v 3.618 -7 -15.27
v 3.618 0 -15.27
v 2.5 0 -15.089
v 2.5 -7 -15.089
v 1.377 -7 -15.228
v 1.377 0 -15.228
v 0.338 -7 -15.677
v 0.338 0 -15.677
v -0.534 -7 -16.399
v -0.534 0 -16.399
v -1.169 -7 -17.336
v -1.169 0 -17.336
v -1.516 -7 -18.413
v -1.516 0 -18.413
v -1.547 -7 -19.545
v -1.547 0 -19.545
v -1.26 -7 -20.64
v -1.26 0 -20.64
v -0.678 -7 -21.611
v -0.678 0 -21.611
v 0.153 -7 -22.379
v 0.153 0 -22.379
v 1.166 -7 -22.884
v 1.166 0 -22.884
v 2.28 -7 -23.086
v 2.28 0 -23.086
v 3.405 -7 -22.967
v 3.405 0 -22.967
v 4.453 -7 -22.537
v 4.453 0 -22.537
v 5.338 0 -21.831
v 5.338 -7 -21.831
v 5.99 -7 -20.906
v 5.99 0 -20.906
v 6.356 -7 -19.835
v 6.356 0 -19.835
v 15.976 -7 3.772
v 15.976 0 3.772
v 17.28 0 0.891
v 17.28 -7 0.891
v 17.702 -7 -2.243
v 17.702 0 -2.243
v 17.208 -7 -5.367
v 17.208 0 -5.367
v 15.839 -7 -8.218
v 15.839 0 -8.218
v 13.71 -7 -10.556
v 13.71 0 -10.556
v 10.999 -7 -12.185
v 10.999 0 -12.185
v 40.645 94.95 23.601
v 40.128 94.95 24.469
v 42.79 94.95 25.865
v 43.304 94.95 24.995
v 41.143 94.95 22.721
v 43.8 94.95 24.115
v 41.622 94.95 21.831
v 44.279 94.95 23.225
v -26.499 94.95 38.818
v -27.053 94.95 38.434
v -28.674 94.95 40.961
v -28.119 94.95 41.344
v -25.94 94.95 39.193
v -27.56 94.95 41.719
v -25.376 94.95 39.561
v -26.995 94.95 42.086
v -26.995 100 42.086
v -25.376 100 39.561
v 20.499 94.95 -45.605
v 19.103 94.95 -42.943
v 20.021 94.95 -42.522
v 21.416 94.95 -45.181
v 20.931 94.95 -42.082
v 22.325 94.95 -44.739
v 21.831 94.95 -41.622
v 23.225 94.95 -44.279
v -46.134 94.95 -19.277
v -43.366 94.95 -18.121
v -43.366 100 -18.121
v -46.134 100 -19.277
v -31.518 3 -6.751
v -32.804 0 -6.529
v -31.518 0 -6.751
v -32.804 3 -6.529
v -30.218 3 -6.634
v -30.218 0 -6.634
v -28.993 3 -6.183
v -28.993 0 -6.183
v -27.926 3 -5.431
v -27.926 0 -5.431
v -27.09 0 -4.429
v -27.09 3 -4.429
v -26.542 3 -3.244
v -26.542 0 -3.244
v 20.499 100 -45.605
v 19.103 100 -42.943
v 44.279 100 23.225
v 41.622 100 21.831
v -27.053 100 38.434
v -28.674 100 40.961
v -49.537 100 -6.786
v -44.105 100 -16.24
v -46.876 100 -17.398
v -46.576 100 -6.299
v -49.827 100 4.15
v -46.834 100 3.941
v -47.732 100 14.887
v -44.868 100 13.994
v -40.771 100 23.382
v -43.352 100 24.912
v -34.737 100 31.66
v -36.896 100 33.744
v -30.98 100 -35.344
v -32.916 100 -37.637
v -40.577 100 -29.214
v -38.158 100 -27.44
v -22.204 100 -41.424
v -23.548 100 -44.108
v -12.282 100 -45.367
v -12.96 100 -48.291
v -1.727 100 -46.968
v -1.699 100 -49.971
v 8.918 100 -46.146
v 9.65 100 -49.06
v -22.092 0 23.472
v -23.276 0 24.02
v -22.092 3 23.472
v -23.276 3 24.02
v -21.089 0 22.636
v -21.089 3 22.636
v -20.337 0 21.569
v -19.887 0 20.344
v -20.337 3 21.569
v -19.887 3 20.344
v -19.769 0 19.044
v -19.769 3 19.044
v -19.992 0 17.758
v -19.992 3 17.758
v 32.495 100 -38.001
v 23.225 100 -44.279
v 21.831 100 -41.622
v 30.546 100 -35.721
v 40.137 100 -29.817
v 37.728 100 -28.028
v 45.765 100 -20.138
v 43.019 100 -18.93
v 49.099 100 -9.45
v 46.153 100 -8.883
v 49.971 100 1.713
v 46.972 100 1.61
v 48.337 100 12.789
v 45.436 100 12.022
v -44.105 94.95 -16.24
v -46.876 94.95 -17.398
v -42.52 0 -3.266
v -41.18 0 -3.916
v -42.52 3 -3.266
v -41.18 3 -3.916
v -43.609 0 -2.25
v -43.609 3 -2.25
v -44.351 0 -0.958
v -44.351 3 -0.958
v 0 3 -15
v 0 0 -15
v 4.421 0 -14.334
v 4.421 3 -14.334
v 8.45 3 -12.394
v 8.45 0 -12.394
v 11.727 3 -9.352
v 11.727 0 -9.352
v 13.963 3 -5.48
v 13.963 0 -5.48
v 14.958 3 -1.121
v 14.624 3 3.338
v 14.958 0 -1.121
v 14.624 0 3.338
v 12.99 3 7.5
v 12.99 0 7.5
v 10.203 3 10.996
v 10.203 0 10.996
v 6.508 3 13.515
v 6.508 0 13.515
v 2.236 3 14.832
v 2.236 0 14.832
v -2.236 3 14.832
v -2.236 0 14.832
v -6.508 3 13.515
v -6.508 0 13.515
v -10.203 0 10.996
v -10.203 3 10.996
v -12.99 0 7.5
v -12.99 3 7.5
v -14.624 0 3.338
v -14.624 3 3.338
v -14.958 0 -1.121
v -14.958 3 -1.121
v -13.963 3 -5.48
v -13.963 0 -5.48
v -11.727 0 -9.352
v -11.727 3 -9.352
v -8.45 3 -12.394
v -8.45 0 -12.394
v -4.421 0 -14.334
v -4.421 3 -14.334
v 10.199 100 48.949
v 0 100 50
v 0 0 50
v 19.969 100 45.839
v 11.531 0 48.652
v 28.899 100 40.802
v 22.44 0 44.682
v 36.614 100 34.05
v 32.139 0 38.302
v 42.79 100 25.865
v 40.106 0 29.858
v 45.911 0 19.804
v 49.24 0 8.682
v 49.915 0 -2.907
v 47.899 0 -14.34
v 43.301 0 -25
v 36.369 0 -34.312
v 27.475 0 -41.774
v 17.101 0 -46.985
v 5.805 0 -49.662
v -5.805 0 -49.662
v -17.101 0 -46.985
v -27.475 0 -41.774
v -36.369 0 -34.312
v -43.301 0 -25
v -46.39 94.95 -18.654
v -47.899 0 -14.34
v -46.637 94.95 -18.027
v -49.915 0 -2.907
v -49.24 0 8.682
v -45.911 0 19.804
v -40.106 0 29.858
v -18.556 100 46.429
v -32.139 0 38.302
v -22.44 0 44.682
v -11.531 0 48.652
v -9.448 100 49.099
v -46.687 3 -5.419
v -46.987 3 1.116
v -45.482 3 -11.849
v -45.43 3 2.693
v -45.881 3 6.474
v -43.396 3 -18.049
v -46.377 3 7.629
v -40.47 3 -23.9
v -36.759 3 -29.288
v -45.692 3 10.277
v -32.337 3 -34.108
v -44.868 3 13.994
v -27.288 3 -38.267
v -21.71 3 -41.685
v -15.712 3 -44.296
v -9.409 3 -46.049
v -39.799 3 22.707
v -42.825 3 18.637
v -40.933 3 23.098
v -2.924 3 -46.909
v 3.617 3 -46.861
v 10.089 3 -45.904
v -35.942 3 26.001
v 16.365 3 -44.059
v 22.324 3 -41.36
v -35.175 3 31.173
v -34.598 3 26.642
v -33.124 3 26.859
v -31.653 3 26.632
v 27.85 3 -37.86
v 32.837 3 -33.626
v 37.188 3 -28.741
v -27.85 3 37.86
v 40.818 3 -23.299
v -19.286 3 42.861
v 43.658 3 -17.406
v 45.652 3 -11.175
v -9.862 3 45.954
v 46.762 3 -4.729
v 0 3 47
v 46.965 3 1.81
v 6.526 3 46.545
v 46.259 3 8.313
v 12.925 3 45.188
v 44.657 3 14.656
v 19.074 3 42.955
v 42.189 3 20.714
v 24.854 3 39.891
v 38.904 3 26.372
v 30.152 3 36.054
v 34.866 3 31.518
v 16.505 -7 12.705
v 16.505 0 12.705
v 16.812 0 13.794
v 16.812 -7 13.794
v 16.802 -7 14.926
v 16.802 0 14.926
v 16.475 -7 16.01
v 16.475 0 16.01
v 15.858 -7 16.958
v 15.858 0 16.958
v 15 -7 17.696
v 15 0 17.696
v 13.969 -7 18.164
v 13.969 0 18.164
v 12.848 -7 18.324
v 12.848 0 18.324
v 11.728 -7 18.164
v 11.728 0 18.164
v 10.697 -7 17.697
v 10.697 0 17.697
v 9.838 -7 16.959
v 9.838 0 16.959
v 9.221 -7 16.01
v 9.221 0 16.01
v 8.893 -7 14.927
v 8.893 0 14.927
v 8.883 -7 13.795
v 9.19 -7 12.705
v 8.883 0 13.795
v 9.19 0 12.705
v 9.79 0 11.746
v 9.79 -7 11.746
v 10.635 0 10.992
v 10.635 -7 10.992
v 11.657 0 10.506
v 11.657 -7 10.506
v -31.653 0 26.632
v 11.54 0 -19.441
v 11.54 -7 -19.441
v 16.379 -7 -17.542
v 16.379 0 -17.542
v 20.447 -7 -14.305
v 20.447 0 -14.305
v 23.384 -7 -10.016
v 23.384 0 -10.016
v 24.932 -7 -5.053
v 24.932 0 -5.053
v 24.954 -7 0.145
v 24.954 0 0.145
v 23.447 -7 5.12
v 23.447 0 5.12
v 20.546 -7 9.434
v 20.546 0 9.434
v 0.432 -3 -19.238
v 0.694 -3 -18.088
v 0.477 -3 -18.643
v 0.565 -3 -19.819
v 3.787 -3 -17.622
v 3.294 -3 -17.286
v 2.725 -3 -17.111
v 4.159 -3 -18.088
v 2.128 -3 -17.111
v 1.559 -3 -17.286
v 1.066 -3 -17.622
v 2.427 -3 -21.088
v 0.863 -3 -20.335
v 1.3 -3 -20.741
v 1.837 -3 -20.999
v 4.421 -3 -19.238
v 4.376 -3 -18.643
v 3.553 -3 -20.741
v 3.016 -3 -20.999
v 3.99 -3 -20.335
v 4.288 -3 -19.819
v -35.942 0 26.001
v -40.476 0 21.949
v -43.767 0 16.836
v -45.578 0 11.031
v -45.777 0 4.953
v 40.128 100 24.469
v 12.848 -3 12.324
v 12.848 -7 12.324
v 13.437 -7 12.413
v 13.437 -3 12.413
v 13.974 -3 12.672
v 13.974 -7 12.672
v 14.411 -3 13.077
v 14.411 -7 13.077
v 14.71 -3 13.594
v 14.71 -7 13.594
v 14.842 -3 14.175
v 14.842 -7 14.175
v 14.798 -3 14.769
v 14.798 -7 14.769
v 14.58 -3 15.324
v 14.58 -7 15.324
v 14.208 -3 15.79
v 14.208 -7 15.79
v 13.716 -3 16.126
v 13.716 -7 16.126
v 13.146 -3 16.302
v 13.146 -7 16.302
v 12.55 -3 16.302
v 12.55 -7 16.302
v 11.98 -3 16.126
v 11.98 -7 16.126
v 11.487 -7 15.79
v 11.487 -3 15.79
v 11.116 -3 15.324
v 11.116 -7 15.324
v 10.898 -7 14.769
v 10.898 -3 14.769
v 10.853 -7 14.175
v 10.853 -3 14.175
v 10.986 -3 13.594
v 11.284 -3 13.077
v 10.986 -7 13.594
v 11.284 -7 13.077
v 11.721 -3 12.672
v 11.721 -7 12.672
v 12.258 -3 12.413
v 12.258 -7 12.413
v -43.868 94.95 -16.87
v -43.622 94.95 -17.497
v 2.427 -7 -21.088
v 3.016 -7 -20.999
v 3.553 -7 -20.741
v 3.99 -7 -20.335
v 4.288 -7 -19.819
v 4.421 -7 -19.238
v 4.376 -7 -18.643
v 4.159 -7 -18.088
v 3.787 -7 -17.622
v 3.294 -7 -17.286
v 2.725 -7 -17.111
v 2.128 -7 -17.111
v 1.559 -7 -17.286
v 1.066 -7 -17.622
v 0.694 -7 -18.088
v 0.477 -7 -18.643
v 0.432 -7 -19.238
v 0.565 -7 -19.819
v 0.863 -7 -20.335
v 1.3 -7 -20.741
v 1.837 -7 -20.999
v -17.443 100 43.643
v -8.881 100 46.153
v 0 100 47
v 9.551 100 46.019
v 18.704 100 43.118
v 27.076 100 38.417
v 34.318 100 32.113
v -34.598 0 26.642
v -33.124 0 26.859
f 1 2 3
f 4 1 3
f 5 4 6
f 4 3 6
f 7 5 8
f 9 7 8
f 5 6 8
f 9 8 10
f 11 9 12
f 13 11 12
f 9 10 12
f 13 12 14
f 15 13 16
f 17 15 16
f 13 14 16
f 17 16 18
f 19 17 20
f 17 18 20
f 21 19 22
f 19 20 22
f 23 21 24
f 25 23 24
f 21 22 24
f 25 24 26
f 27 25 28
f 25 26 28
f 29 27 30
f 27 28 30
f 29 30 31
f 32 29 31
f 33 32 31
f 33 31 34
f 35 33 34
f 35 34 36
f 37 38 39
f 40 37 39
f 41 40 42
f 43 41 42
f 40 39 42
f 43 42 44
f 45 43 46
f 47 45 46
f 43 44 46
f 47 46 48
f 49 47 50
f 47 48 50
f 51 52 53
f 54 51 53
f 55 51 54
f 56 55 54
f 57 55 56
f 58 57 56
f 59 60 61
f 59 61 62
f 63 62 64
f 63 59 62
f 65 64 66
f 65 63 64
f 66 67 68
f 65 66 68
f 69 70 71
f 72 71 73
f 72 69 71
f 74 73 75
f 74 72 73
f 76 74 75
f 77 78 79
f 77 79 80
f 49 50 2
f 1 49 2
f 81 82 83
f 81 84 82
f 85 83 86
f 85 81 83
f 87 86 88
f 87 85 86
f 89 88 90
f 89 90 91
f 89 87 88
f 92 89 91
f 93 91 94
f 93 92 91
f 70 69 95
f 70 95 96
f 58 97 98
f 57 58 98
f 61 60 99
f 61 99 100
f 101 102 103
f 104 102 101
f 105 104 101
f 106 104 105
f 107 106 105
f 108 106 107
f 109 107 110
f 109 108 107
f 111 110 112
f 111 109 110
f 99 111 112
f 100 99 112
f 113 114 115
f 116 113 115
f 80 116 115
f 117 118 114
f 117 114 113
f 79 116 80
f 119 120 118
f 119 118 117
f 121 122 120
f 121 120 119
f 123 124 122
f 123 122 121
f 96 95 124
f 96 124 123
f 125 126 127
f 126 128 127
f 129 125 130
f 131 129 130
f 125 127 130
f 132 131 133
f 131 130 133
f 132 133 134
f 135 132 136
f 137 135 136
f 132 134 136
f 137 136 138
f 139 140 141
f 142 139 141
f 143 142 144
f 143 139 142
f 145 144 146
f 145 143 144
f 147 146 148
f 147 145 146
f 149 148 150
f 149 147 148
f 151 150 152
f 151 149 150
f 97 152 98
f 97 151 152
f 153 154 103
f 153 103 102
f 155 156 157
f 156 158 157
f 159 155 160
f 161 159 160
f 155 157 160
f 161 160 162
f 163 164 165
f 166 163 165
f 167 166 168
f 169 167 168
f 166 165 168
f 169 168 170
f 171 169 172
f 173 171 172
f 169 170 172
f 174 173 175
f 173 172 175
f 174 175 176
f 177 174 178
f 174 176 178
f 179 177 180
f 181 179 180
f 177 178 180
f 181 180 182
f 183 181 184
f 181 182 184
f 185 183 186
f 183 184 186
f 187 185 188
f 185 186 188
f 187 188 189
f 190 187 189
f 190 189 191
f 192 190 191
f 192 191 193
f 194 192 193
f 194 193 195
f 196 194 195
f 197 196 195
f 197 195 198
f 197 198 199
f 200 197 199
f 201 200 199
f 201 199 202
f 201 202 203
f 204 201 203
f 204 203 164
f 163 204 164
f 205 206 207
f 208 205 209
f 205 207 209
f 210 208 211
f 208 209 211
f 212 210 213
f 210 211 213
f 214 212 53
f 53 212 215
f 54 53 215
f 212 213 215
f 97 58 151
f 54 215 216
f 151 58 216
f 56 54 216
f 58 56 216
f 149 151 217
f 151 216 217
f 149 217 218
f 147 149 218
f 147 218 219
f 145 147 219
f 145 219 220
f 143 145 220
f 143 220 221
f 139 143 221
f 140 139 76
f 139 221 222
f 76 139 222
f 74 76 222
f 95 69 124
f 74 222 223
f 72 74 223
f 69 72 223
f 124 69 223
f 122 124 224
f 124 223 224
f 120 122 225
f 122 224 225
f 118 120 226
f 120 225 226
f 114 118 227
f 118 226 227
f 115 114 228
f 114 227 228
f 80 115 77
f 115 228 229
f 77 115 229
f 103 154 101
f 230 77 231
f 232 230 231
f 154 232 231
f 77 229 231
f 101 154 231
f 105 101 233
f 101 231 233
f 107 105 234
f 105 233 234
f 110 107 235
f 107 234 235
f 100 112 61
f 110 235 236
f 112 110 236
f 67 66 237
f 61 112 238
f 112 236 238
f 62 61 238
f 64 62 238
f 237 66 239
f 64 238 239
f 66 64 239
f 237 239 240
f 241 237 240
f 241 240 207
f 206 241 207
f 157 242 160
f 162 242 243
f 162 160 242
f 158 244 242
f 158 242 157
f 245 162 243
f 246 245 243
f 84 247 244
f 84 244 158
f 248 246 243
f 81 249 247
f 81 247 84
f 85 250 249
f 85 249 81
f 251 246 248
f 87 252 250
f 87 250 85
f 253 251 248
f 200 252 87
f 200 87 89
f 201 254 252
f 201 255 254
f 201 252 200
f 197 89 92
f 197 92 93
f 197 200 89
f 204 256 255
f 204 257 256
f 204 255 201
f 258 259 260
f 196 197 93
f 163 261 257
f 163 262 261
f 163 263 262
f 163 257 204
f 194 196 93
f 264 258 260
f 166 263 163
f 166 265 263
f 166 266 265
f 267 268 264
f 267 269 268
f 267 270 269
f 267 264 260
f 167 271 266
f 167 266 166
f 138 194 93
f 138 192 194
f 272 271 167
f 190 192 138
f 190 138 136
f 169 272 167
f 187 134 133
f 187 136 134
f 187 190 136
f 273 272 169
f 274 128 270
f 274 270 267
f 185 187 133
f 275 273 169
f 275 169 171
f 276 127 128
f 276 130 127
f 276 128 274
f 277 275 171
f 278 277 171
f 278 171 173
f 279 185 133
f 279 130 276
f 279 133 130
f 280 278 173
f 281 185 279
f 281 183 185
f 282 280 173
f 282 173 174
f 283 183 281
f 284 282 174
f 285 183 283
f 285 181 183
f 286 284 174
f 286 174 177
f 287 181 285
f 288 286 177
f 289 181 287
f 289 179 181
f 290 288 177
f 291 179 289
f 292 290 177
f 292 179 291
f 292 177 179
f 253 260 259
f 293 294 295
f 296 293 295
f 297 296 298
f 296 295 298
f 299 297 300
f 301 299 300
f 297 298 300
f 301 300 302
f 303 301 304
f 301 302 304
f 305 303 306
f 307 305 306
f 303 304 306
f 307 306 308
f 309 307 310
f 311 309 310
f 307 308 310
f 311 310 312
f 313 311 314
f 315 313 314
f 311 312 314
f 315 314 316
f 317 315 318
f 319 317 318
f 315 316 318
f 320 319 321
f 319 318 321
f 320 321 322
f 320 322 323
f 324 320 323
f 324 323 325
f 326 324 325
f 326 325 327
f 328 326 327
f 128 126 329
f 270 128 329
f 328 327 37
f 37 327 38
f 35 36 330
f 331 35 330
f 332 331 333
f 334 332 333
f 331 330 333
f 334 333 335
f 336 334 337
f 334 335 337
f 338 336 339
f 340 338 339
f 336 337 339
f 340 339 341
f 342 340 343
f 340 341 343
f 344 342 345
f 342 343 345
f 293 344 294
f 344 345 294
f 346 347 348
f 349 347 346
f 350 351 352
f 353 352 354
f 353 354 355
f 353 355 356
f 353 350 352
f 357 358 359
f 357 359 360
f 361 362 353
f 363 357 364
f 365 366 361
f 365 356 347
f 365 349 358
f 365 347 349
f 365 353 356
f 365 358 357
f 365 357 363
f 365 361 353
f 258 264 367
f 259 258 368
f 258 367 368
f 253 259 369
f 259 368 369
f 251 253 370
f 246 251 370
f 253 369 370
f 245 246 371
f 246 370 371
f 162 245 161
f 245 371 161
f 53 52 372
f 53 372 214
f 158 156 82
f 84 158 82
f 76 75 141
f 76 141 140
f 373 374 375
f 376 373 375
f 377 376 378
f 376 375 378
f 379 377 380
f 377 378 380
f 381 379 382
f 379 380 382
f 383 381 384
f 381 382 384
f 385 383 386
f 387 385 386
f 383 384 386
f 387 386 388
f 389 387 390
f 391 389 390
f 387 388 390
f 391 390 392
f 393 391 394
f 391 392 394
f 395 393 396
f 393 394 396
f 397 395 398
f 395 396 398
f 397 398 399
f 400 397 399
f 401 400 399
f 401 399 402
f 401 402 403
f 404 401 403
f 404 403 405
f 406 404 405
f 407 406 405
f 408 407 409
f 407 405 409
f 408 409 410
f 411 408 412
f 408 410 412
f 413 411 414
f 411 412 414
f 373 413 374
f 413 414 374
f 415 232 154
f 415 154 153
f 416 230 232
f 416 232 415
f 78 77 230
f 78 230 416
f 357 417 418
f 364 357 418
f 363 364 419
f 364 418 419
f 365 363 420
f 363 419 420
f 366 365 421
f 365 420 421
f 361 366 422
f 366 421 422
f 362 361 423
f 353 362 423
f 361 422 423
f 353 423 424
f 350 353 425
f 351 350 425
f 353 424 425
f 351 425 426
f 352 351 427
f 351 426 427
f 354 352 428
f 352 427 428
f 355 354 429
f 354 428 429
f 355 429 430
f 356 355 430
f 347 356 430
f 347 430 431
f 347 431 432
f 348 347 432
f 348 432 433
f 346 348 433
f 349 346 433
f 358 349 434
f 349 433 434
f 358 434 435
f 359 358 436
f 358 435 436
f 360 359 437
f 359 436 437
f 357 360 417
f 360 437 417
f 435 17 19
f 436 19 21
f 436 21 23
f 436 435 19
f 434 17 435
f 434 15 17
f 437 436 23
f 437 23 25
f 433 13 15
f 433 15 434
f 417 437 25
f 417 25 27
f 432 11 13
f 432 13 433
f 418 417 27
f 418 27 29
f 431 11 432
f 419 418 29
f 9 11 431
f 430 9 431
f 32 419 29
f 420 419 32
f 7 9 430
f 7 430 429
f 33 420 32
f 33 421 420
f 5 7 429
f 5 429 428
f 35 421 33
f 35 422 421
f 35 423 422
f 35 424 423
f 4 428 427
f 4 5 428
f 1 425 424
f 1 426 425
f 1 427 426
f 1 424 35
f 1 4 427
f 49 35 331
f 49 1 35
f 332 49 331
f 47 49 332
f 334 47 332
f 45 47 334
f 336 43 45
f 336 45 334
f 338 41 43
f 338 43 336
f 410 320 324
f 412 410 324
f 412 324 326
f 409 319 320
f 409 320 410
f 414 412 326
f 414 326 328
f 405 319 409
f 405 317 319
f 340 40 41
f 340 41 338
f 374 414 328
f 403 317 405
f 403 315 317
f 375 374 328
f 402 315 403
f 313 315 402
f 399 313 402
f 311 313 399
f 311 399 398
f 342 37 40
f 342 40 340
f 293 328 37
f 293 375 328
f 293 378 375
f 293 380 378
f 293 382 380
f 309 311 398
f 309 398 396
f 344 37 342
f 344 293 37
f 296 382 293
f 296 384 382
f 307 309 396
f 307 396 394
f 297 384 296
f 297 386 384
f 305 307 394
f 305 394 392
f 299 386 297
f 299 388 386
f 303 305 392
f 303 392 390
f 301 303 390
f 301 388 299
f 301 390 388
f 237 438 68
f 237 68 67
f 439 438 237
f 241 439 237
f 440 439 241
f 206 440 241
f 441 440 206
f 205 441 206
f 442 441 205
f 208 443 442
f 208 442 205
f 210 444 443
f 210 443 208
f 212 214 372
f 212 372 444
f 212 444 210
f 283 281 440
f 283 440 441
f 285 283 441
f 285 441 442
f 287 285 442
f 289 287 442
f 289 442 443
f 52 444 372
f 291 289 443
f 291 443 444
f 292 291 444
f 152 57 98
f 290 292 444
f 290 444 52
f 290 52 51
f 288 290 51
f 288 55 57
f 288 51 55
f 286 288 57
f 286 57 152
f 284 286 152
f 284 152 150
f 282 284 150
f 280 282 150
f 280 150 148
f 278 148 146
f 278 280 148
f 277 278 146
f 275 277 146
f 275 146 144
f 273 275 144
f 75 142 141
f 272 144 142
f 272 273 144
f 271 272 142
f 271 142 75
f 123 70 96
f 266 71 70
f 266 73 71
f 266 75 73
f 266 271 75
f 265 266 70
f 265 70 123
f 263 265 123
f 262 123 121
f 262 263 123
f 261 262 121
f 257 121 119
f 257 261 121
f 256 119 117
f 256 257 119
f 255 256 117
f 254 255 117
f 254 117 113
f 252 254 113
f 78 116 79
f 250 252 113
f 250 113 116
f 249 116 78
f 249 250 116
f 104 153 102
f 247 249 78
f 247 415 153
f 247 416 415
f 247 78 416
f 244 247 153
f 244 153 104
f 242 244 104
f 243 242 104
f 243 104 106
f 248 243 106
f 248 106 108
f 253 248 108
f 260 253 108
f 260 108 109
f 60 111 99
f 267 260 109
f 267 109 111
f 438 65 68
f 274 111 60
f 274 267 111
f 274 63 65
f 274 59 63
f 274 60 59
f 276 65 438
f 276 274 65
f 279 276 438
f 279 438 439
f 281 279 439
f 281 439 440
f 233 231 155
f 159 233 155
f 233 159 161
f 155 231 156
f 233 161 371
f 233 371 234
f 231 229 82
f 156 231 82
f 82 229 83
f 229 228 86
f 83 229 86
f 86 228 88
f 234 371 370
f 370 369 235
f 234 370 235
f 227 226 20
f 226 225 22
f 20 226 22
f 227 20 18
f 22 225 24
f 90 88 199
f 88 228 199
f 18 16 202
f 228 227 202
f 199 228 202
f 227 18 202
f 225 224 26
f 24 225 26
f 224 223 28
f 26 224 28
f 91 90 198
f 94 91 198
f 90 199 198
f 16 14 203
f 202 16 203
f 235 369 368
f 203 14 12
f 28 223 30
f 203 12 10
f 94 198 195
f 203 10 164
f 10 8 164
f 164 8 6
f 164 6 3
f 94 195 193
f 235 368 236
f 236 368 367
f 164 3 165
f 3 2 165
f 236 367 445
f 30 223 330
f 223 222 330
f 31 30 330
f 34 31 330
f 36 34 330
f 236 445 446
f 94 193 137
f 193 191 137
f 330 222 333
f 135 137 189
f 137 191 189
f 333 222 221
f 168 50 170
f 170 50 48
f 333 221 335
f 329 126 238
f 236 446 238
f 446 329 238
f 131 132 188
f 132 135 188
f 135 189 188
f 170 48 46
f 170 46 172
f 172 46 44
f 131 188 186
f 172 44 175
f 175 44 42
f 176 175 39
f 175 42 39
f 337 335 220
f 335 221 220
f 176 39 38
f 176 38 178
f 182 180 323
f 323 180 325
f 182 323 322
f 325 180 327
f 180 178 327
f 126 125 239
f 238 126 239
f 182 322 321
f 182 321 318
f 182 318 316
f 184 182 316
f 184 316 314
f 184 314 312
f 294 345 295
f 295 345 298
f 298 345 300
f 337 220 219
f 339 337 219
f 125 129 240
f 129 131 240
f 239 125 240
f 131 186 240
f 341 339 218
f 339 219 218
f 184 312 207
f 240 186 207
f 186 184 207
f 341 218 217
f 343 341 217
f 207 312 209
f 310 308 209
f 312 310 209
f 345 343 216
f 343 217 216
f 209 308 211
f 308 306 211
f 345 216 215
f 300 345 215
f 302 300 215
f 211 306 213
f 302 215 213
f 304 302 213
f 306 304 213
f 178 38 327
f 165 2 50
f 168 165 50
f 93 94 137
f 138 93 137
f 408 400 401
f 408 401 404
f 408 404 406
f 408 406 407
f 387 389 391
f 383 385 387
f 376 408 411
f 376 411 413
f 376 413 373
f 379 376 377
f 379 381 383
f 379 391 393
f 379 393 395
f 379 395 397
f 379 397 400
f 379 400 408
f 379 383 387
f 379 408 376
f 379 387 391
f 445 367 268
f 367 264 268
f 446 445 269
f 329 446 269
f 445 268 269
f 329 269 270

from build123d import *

# Parameters (mm, degrees)
SKETCH1_R           = 50
BOSS_EXTRUDE1_DEPTH = 100
SHELL1_T            = -3
CUT_EXTRUDE1_REACH  = 124.474
SKETCH2_R           = 15
BOSS_EXTRUDE2_DEPTH = 7
SKETCH4_R           = 2
CUT_EXTRUDE2_DEPTH  = 4
CUT_EXTRUDE3_DEPTH  = 3
FILLET1_R           = 5
CAVITY1_START       = 94.95
CAVITY1_DEPTH       = 5.05


# Read off the part's stored shape, not the designer's step: Cavity1
with BuildPart() as part:
    # Sketch1 → Boss-Extrude1 (new body)
    with BuildSketch(Plane(origin=(0, 0, 0), x_dir=(1, 0, 0), z_dir=(0, 1, 0))):
        with Locations(Location((0, 0, 0), (0, 0, 270))):
            Circle(SKETCH1_R)
    extrude(amount=BOSS_EXTRUDE1_DEPTH)

    # Shell1
    shell1_openings = [part.faces().sort_by_distance(p)[0] for p in [
        (0, 100, 0),
    ]]
    offset(amount=SHELL1_T, openings=shell1_openings, kind=Kind.INTERSECTION)

    # Sketch2 → Cut-Extrude1 (cut, up to next)
    with BuildSketch(Plane.XZ, mode=Mode.PRIVATE) as cut_extrude1_sk1:
        with Locations(Location((0, 0, 0), (0, 0, 270))):
            Circle(SKETCH2_R)
    cut_extrude1_tool1 = extrude(cut_extrude1_sk1.sketch, amount=-CUT_EXTRUDE1_REACH, mode=Mode.PRIVATE) & part.part
    add(cut_extrude1_tool1.solids().sort_by_distance((0, 0, 0))[0], mode=Mode.SUBTRACT)

    # Sketch3 → Boss-Extrude2 (add)
    with BuildSketch(Plane.XZ):
        with BuildLine():
            Line((11.656771923, 10.505696947), (15.97605159, 3.771914714))
            ThreePointArc((15.97605159, 3.771914714), (17.208044811, -5.36712002), (10.999048015, -12.185339871))
            Line((10.999048015, -12.185339871), (3.617532023, -15.269690962))
            ThreePointArc((3.617532023, -15.269690962), (-1.003618951, -21.145948661), (6.356204016, -19.835053254))
            ThreePointArc((6.356204016, -19.835053254), (24.343421913, -7.592615462), (16.505212694, 12.704669259))
            ThreePointArc((16.505212694, 12.704669259), (11.195588228, 17.967114404), (11.656771923, 10.505696947))
        make_face()
    extrude(amount=BOSS_EXTRUDE2_DEPTH)

    # Sketch4 → Cut-Extrude2 (cut)
    with BuildSketch(Plane.XZ.offset(7)):
        with Locations(Location((12.847770427, 14.324272933, 0), (0, 0, 270))):
            Circle(SKETCH4_R)
        with Locations(Location((2.426533519, -19.088266948, 0), (0, 0, 270))):
            Circle(SKETCH4_R)
    extrude(amount=-CUT_EXTRUDE2_DEPTH, mode=Mode.SUBTRACT)

    # Sketch5 → Cut-Extrude3 (cut)
    with BuildSketch(Plane.XZ):
        with BuildLine():
            Line((-28.03113406, -8.017376473), (-18.503146029, 22.531231418))
            Line((-18.503146029, 22.531231418), (-33.777449975, 27.295225433))
            ThreePointArc((-33.777449975, 27.295225433), (-44.86826784, 13.99423242), (-43.305438005, -3.253382458))
            Line((-43.305438005, -3.253382458), (-28.03113406, -8.017376473))
        make_face()
    extrude(amount=-CUT_EXTRUDE3_DEPTH, mode=Mode.SUBTRACT)

    # Fillet1
    fillet1_edges = [part.edges().sort_by_distance(p)[0] for p in [
        (-33.777449975, 1.5, 27.295225433),
        (-18.503146029, 1.5, 22.531231418),
        (-28.03113406, 1.5, -8.017376473),
        (-43.305438005, 1.5, -3.253382458),
    ]]
    fillet(fillet1_edges, radius=FILLET1_R)

    # Cavity1 outline → Cavity1 (cut)
    with BuildSketch(Plane(origin=(0, 0, 0), x_dir=(1, 0, 0), z_dir=(0, 1, 0)).offset(CAVITY1_START)):
        with BuildLine():
            ThreePointArc((19.102530443, 42.942907804), (20.477537397, 42.30449695), (21.831239809, 41.622073091))
            Line((21.831239809, 41.622073091), (23.224723201, 44.278801161))
            ThreePointArc((23.224723201, 44.278801161), (21.871785206, 44.962484495), (20.498743854, 45.604840756))
            Line((20.498743854, 45.604840756), (19.102530443, 42.942907804))
        make_face()
        with BuildLine():
            Line((44.278801161, -23.224723201), (41.622073091, -21.831239809))
            ThreePointArc((41.622073091, -21.831239809), (40.896346213, -23.162229305), (40.128071352, -24.469121144))
            Line((40.128071352, -24.469121144), (42.790004304, -25.865334555))
            ThreePointArc((42.790004304, -25.865334555), (43.55441916, -24.556314293), (44.278801161, -23.224723201))
        make_face()
        with BuildLine():
            ThreePointArc((-44.105134018, 16.239986245), (-43.745876837, 17.184244522), (-43.366406458, 18.120562655))
            Line((-43.366406458, 18.120562655), (-46.134474955, 19.277194314))
            ThreePointArc((-46.134474955, 19.277194314), (-46.514536622, 18.341152714), (-46.875608808, 17.397623369))
            Line((-46.875608808, 17.397623369), (-44.105134018, 16.239986245))
        make_face()
        with BuildLine():
            Line((-26.99549792, -42.086138954), (-25.375768045, -39.560970617))
            ThreePointArc((-25.375768045, -39.560970617), (-26.220241948, -39.006395786), (-27.052600539, -38.43379768))
            Line((-27.052600539, -38.43379768), (-28.673738451, -40.961161156))
            ThreePointArc((-28.673738451, -40.961161156), (-27.840301063, -41.532127765), (-26.99549792, -42.086138954))
        make_face()
    extrude(amount=CAVITY1_DEPTH, mode=Mode.SUBTRACT)


solid = part.part
